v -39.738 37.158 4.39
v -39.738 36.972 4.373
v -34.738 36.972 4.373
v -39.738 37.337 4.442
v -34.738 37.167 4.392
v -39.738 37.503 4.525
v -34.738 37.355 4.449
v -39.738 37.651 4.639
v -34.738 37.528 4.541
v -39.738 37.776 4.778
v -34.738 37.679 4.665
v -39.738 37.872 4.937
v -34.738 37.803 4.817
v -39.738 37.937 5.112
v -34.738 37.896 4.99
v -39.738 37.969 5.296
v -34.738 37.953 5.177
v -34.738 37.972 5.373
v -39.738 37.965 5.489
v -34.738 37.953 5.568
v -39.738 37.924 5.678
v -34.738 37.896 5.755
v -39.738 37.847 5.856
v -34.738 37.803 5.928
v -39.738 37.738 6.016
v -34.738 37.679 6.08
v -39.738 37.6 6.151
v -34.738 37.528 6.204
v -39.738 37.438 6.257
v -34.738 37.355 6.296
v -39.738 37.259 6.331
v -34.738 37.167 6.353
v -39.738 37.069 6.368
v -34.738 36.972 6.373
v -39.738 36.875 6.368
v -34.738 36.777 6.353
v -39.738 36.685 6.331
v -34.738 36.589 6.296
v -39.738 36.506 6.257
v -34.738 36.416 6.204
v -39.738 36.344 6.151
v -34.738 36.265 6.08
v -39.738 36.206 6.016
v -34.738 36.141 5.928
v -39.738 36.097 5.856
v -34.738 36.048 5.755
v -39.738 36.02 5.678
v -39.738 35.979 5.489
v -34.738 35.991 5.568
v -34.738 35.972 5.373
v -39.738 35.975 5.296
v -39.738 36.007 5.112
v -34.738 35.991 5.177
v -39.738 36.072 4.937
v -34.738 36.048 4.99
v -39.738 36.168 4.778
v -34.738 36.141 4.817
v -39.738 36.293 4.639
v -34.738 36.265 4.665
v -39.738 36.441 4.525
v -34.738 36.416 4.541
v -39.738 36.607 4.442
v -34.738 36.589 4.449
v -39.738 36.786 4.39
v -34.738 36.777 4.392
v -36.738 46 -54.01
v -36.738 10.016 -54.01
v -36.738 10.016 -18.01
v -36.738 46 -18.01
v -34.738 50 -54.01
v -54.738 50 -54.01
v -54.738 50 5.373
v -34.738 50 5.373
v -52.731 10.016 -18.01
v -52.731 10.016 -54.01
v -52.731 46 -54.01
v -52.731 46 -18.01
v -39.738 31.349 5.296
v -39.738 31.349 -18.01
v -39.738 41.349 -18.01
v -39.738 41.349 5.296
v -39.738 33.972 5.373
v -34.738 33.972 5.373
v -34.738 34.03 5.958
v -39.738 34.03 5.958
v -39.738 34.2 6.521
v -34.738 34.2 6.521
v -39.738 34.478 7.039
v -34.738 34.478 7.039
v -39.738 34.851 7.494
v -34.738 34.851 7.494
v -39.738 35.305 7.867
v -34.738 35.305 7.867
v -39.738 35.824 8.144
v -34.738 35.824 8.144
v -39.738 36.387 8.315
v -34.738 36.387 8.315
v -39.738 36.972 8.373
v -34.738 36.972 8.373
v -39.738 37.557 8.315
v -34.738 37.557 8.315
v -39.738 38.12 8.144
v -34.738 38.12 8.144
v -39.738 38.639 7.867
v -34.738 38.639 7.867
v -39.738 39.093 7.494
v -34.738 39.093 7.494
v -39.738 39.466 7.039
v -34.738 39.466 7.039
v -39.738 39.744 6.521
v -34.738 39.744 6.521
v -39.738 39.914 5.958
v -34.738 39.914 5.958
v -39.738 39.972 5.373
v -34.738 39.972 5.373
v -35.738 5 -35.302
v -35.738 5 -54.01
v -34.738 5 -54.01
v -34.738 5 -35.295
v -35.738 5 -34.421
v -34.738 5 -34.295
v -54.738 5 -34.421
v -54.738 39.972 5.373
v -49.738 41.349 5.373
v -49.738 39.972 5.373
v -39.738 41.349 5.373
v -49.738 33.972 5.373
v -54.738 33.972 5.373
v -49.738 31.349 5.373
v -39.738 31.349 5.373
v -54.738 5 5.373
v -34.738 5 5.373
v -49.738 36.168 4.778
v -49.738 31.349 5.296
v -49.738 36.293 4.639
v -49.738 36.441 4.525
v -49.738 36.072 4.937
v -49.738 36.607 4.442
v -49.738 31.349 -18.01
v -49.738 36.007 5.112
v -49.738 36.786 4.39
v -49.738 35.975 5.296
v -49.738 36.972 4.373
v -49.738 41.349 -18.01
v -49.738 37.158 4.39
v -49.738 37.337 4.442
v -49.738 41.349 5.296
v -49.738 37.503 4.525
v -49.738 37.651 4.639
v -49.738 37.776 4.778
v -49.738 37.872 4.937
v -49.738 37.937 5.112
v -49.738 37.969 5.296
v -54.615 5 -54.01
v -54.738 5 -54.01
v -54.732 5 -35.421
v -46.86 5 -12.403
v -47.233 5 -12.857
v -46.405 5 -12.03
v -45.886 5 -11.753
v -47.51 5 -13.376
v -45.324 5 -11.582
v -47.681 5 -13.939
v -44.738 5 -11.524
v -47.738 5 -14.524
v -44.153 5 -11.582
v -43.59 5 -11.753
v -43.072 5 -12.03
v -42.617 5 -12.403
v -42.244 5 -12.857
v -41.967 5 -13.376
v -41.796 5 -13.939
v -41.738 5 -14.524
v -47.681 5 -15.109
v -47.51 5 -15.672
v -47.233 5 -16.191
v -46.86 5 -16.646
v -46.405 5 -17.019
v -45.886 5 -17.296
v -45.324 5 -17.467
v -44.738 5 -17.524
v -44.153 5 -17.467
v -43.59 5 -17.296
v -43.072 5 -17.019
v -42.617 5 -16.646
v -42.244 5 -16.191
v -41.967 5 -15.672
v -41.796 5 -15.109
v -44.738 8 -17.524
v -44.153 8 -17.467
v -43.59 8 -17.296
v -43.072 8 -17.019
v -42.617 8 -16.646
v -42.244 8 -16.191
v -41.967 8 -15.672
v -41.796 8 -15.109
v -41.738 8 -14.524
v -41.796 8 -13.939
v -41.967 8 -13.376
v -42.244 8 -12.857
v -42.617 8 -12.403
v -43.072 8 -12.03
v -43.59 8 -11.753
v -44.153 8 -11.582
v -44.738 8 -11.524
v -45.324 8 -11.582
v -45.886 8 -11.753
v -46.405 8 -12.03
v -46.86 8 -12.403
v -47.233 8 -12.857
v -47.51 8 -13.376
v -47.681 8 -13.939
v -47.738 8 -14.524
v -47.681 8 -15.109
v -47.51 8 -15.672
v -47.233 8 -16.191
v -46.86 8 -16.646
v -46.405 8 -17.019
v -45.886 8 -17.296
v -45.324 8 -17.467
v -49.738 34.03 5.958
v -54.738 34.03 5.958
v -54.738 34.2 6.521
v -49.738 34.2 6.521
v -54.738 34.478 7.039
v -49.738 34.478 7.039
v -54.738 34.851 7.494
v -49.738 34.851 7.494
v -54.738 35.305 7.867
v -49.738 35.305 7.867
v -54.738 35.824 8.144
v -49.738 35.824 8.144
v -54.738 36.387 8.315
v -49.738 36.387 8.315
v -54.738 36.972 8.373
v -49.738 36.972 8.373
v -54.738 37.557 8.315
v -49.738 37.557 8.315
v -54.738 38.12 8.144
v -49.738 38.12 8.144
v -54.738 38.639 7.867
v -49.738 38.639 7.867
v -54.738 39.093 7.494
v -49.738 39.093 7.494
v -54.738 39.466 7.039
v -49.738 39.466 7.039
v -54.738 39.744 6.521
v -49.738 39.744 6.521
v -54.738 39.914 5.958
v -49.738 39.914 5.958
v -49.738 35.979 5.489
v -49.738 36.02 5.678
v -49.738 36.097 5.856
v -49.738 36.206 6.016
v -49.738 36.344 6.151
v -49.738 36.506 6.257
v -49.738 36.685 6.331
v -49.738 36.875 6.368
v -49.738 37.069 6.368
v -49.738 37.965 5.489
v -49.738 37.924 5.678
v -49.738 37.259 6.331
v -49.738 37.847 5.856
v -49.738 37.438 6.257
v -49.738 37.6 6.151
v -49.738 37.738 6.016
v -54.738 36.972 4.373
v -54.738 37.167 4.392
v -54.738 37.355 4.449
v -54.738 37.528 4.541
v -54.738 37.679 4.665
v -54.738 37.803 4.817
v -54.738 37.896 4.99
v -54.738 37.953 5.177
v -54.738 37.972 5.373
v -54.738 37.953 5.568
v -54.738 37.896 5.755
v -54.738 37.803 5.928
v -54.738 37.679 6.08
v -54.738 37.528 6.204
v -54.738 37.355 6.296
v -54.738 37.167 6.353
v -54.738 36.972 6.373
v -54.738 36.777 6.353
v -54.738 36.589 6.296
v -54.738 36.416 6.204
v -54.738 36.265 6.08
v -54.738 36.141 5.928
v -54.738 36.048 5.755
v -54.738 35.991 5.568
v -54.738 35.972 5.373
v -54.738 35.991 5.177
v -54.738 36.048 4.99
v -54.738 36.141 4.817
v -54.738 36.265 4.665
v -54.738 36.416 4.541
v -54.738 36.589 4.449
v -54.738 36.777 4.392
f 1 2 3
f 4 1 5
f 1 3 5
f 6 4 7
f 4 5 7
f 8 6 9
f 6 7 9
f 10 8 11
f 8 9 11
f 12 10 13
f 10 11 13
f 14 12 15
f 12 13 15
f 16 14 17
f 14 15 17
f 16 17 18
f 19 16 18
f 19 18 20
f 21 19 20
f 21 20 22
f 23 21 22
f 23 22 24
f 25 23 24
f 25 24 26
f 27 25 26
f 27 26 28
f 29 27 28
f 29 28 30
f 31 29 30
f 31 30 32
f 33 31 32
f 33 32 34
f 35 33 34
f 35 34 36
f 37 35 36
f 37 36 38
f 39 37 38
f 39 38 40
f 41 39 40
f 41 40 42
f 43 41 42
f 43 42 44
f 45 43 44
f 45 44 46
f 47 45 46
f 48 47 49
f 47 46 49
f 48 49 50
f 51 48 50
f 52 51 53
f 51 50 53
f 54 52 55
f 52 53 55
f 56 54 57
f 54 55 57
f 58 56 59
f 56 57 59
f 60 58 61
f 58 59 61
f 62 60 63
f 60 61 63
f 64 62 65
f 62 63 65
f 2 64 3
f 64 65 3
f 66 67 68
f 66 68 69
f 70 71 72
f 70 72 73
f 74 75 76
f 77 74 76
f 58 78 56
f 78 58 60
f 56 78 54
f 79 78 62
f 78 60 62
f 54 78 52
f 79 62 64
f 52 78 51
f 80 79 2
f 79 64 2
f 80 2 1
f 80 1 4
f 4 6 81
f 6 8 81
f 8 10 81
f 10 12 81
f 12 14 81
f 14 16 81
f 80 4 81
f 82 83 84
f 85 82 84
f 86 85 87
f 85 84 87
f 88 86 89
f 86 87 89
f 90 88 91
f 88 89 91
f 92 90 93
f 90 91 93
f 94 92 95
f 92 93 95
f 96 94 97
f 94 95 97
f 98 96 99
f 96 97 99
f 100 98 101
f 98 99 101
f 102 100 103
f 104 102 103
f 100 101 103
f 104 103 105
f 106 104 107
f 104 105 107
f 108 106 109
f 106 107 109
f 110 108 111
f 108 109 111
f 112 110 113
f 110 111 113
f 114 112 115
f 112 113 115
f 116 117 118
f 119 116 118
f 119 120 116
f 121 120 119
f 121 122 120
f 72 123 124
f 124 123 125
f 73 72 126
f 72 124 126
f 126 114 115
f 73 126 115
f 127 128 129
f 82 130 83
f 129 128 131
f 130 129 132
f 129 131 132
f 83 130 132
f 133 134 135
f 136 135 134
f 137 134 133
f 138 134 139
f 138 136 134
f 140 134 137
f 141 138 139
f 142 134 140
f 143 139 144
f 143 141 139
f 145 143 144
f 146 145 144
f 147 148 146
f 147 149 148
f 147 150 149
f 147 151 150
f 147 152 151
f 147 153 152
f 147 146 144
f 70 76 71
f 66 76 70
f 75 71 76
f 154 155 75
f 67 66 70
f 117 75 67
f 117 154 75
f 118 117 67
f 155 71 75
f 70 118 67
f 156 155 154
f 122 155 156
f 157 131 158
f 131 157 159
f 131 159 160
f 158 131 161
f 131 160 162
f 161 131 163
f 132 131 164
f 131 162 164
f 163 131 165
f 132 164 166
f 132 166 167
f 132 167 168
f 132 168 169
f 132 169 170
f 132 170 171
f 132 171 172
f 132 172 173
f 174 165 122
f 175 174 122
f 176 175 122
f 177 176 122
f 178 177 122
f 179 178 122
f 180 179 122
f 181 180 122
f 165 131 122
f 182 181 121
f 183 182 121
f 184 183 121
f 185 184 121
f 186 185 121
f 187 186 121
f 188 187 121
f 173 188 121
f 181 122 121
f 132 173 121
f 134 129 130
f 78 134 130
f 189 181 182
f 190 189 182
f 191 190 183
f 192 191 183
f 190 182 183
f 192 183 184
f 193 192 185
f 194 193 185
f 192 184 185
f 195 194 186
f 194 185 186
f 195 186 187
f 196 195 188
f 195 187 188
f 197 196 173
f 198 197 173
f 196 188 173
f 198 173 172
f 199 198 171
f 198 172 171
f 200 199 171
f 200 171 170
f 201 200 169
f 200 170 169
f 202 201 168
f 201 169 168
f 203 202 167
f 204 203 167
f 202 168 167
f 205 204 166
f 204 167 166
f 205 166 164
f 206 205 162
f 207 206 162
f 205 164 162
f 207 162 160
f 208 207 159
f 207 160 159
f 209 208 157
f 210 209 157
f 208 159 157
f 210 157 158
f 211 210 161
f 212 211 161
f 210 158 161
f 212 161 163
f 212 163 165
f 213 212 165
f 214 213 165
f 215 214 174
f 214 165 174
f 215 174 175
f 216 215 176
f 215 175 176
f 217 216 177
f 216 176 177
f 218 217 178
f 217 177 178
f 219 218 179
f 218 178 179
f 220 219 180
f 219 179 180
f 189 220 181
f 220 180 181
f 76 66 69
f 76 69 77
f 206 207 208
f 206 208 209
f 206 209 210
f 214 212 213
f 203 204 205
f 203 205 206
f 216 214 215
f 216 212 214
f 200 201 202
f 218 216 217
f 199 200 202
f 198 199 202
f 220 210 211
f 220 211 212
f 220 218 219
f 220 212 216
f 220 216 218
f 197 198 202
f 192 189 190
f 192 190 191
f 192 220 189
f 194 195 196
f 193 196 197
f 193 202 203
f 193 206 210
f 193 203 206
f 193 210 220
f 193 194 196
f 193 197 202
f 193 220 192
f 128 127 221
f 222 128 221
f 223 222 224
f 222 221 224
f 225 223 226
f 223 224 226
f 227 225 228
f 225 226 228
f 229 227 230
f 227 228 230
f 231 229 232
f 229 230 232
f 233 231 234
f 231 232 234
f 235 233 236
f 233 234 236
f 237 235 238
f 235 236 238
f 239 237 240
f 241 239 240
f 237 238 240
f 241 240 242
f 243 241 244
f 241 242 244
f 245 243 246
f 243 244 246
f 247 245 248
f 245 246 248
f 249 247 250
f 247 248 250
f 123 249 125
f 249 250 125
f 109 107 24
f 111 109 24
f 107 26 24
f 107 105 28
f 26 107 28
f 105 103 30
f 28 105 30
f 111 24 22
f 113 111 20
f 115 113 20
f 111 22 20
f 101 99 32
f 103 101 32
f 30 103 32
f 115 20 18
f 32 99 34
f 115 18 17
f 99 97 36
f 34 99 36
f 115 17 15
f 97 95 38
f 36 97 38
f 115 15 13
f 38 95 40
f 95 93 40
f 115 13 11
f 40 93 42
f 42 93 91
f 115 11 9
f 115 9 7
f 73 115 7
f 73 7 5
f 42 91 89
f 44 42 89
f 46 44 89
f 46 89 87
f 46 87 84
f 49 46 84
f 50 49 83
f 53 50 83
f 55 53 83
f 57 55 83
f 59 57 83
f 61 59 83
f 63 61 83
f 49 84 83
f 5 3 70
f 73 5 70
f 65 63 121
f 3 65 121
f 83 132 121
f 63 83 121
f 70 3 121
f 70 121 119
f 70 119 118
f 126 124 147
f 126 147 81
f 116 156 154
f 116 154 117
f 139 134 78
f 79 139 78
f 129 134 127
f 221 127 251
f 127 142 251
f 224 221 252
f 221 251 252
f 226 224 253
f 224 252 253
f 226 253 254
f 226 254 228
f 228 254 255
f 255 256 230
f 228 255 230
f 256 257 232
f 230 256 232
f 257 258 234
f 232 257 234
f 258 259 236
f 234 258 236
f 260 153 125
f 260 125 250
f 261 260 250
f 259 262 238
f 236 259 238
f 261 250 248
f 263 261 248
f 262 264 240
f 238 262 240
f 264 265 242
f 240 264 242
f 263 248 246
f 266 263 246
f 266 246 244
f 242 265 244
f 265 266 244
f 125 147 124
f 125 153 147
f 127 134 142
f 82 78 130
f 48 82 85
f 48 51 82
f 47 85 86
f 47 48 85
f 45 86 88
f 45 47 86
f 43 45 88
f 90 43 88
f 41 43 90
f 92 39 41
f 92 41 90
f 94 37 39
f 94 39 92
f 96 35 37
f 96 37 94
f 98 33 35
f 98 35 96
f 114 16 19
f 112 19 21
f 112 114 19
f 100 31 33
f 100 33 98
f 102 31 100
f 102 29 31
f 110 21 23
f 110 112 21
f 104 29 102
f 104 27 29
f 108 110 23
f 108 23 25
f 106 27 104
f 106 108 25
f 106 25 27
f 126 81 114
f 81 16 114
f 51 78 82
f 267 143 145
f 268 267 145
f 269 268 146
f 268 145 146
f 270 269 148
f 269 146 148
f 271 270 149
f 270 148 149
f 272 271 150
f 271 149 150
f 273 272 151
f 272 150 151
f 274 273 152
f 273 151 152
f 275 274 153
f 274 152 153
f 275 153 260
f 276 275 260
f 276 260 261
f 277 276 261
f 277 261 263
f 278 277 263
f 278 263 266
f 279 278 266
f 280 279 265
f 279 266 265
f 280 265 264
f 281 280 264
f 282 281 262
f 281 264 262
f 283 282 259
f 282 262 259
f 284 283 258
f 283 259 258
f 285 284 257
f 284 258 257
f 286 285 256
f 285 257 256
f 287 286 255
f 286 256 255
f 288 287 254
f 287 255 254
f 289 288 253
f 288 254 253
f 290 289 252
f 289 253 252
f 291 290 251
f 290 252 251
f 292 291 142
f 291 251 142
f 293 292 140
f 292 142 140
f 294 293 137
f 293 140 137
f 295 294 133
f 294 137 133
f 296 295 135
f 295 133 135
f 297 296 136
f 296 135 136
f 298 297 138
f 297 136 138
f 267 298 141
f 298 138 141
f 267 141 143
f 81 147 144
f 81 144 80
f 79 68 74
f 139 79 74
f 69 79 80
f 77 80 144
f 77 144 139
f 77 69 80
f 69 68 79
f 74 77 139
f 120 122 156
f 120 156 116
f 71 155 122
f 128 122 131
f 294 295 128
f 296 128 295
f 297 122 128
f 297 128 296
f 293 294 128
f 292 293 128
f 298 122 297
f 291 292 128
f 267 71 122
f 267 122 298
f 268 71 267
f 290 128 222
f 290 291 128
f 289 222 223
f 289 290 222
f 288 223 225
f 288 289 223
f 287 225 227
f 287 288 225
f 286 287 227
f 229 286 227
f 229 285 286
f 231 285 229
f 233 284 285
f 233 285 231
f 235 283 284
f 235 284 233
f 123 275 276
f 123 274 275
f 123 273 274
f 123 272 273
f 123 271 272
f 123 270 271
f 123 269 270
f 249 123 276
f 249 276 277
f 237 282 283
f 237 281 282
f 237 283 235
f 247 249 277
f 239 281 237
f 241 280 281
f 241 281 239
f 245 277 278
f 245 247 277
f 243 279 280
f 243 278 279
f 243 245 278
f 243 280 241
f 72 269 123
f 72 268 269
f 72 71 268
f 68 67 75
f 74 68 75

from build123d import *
from build123d.topology import SkipClean

# Parameters (mm, degrees)
BOSS_EXTRUDE2_DEPTH      = 50
BOSS_EXTRUDE2_DEPTH_BACK = 0.0001
SKETCH5_W                = 20
SKETCH5_H                = 59.382936356
SKETCH6_R                = 5
CUT_EXTRUDE1_DEPTH       = 45
SKETCH9_W                = 10
SKETCH9_H                = 10
CUT_EXTRUDE4_DEPTH       = 0.076800532
BOSS_EXTRUDE5_DEPTH      = 5
CUT_EXTRUDE6_DEPTH       = 5
BOSS_EXTRUDE6_START      = -5
BOSS_EXTRUDE6_DEPTH      = 5
SKETCH15_R               = 1
CUT_EXTRUDE7_DEPTH       = 20
SKETCH19_R               = 5
BOSS_EXTRUDE13_DEPTH     = 45
BOSS_EXTRUDE15_DEPTH     = 5
SKETCH22_R               = 1
CUT_EXTRUDE8_DEPTH       = 5
BOSS_EXTRUDE16_START     = -5
BOSS_EXTRUDE16_DEPTH     = 5
SKETCH24_W               = 15.993114704
SKETCH24_H               = 35.984045661
CUT_EXTRUDE9_DEPTH       = 36
SKETCH26_W               = 10
SKETCH26_H               = 10
CUT_EXTRUDE13_DEPTH      = 36
CUT_EXTRUDE14_DEPTH      = 5
SKETCH29_W               = 20.000394844
SKETCH29_H               = 5
CUT_EXTRUDE15_DEPTH      = 1
SKETCH31_R               = 3
CUT_EXTRUDE16_DEPTH      = 3
SKETCH32_W               = 19.994111152
SKETCH32_H               = 5
CUT_EXTRUDE17_DEPTH      = 19
SKETCH33_W               = 19.589439069
SKETCH33_H               = 5
CUT_EXTRUDE18_DEPTH      = 19


with BuildPart() as part:
    # Sketch5 → Boss-Extrude2 (new, two sides: drawn at the far end of the back side and taken through both)
    with BuildSketch(Plane(origin=(0.323578151, 0, -7.846011644), x_dir=(1, 0, 0), z_dir=(0, 1, 0)).offset(-BOSS_EXTRUDE2_DEPTH_BACK)):
        with Locations((-45.061859189, 16.472889188)):
            Rectangle(SKETCH5_W, SKETCH5_H)
    extrude(amount=BOSS_EXTRUDE2_DEPTH + BOSS_EXTRUDE2_DEPTH_BACK)

    # Sketch6 → Cut-Extrude1 (cut)
    with BuildSketch(Plane(origin=(0.323578151, 50, -7.846011644), x_dir=(1, 0, 0), z_dir=(0, 1, 0))):
        with Locations(Location((-45.061859189, 16.574918296, 0), (0, 0, 270))):
            Circle(SKETCH6_R)
    extrude(amount=-CUT_EXTRUDE1_DEPTH, mode=Mode.SUBTRACT)

    # Sketch9 → Cut-Extrude4 (cut)
    with BuildSketch(Plane(origin=(0.323578151, 0, 5.372567346), x_dir=(1, 0, 0), z_dir=(0, 0, 1))):
        with Locations((-45.061859189, 36.348822535)):
            Rectangle(SKETCH9_W, SKETCH9_H)
    extrude(amount=-CUT_EXTRUDE4_DEPTH, mode=Mode.SUBTRACT)

    # Sketch10 → Boss-Extrude5 (add)
    with BuildSketch(Plane(origin=(-34.738281038, 0, -7.846011644), x_dir=(0, 0, -1), z_dir=(1, 0, 0))):
        with BuildLine():
            Line((-13.21857899, 38.972016939), (-13.21857899, 34.972016939))
            ThreePointArc((-13.21857899, 34.972016939), (-15.21857899, 36.972016939), (-13.21857899, 38.972016939))
        make_face()
    extrude(amount=-BOSS_EXTRUDE5_DEPTH)

    # Sketch12 → Cut-Extrude6 (cut)
    with BuildSketch(Plane(origin=(-34.738281038, 0, -7.846011644), x_dir=(0, 0, -1), z_dir=(1, 0, 0))):
        with BuildLine():
            Line((-13.21857899, 37.972016939), (-13.21857899, 35.972016939))
            ThreePointArc((-13.21857899, 35.972016939), (-14.21857899, 36.972016939), (-13.21857899, 37.972016939))
        make_face()
    extrude(amount=-CUT_EXTRUDE6_DEPTH, mode=Mode.SUBTRACT)

    # Sketch14 → Boss-Extrude6 (add)
    with BuildSketch(Plane(origin=(-54.738281038, 0, -7.846011644), x_dir=(0, 0, 1), z_dir=(-1, 0, 0)).offset(BOSS_EXTRUDE6_START)):
        with BuildLine():
            Line((13.21857899, 37.972016939), (13.21857899, 38.972016939))
            ThreePointArc((13.21857899, 38.972016939), (15.21857899, 36.972016939), (13.21857899, 34.972016939))
            Line((13.21857899, 34.972016939), (13.21857899, 35.972016939))
            ThreePointArc((13.21857899, 35.972016939), (14.21857899, 36.972016939), (13.21857899, 37.972016939))
        make_face()
    extrude(amount=BOSS_EXTRUDE6_DEPTH)

    # Sketch15 → Cut-Extrude7 (cut)
    with BuildSketch(Plane(origin=(-34.738281038, 0, -7.846011644), x_dir=(0, 0, -1), z_dir=(1, 0, 0))):
        with Locations((-13.21857899, 36.972016939)):
            Circle(SKETCH15_R)
    extrude(amount=-CUT_EXTRUDE7_DEPTH, mode=Mode.SUBTRACT)

    # Sketch19 → Boss-Extrude13 (add)
    with BuildSketch(Plane(origin=(0.323578151, 50, -7.846011644), x_dir=(1, 0, 0), z_dir=(0, 1, 0))):
        with Locations((-45.061859189, 16.574918296)):
            Circle(SKETCH19_R)
    extrude(amount=-BOSS_EXTRUDE13_DEPTH)

    # Sketch21 → Boss-Extrude15 (add)
    with SkipClean():  # the faces are left unmerged after this step: merging them gives an invalid solid
        with BuildSketch(Plane(origin=(-34.738281038, 0, -7.846011644), x_dir=(0, 0, -1), z_dir=(1, 0, 0))):
            with BuildLine():
                Line((-13.21857899, 39.972016939), (-13.21857899, 37.972016939))
                ThreePointArc((-13.21857899, 37.972016939), (-12.21857899, 36.972016939), (-13.21857899, 35.972016939))
                Line((-13.21857899, 35.972016939), (-13.21857899, 33.972016939))
                ThreePointArc((-13.21857899, 33.972016939), (-16.21857899, 36.972016939), (-13.21857899, 39.972016939))
            make_face()
        extrude(amount=-BOSS_EXTRUDE15_DEPTH)

    # Sketch22 → Cut-Extrude8 (cut)
    with BuildSketch(Plane(origin=(-34.738281038, 0, -7.846011644), x_dir=(0, 0, -1), z_dir=(1, 0, 0))):
        with Locations((-13.21857899, 36.972016939)):
            Circle(SKETCH22_R)
    extrude(amount=-CUT_EXTRUDE8_DEPTH, mode=Mode.SUBTRACT)

    # Sketch23 → Boss-Extrude16 (add)
    with BuildSketch(Plane(origin=(-54.738281038, 0, -7.846011644), x_dir=(0, 0, 1), z_dir=(-1, 0, 0)).offset(BOSS_EXTRUDE16_START)):
        with BuildLine():
            Line((13.21857899, 39.972016939), (13.21857899, 37.972016939))
            ThreePointArc((13.21857899, 37.972016939), (14.21857899, 36.972016939), (13.21857899, 35.972016939))
            Line((13.21857899, 35.972016939), (13.21857899, 33.972016939))
            ThreePointArc((13.21857899, 33.972016939), (16.21857899, 36.972016939), (13.21857899, 39.972016939))
        make_face()
    extrude(amount=BOSS_EXTRUDE16_DEPTH)

    # Sketch24 → Cut-Extrude9 (cut)
    with SkipClean():  # the faces are left unmerged after this step: merging them gives an invalid solid
        with BuildSketch(Plane(origin=(0.323578151, 0, -54.01036901), x_dir=(-1, 0, 0), z_dir=(0, 0, -1))):
            with Locations((45.058416541, 28.00797717)):
                Rectangle(SKETCH24_W, SKETCH24_H)
        extrude(amount=-CUT_EXTRUDE9_DEPTH, mode=Mode.SUBTRACT)

    # Sketch26 → Cut-Extrude13 (cut)
    with SkipClean():  # the faces are left unmerged after this step: merging them gives an invalid solid
        with BuildSketch(Plane(origin=(0.323578151, 0, 5.295766814), x_dir=(1, 0, 0), z_dir=(0, 0, 1))):
            with Locations((-45.061859189, 36.348822535)):
                Rectangle(SKETCH26_W, SKETCH26_H)
        extrude(amount=-CUT_EXTRUDE13_DEPTH, mode=Mode.SUBTRACT)

    # Sketch28 → Cut-Extrude14 (cut)
    with SkipClean():  # the faces are left unmerged after this step: merging them gives an invalid solid
        with BuildSketch(Plane(origin=(0, -0.0001, -2.541953713), x_dir=(-1, 0, 0), z_dir=(0, -1, 0))):
            Polygon((54.738281038, -7.914521059), (34.738281038, -7.914521059), (34.738281038, 31.753302396), (54.738281038, 31.878976227), align=None)
        extrude(amount=-CUT_EXTRUDE14_DEPTH, mode=Mode.SUBTRACT)

    # Sketch29 → Cut-Extrude15 (cut)
    with SkipClean():  # the faces are left unmerged after this step: merging them gives an invalid solid
        with BuildSketch(Plane(origin=(0.1981485, 0, -34.075726363), x_dir=(0.9999802581949765, 0, 0.006283567482586401), z_dir=(-0.006283567482586401, 0, 0.9999802581949766))):
            with Locations((-44.937316682, 2.4999)):
                Rectangle(SKETCH29_W, SKETCH29_H)
        extrude(amount=-CUT_EXTRUDE15_DEPTH, mode=Mode.SUBTRACT)

    # Sketch31 → Cut-Extrude16 (cut)
    with SkipClean():  # the faces are left unmerged after this step: merging them gives an invalid solid
        with BuildSketch(Plane(origin=(0, 4.9999, -2.541953713), x_dir=(-1, 0, 0), z_dir=(0, -1, 0))):
            with Locations(Location((44.738281038, 11.982227584, 0), (0, 0, 90))):
                Circle(SKETCH31_R)
        extrude(amount=-CUT_EXTRUDE16_DEPTH, mode=Mode.SUBTRACT)

    # Sketch32 → Cut-Extrude17 (cut)
    with SkipClean():  # the faces are left unmerged after this step: merging them gives an invalid solid
        with BuildSketch(Plane(origin=(0.22040429, 0, -35.075606257), x_dir=(0.9999802581949765, 0, 0.0062835674825864034), z_dir=(-0.0062835674825864034, 0, 0.9999802581949766))):
            with Locations((-44.956431065, 2.4999)):
                Rectangle(SKETCH32_W, SKETCH32_H)
        extrude(amount=-CUT_EXTRUDE17_DEPTH, mode=Mode.SUBTRACT)

    # Sketch33 → Cut-Extrude18 (cut)
    with SkipClean():  # the faces are left unmerged after this step: merging them gives an invalid solid
        with BuildSketch(Plane.ZY.offset(54.738281038)):
            with Locations((-44.215649476, 2.4999)):
                Rectangle(SKETCH33_W, SKETCH33_H)
        extrude(amount=-CUT_EXTRUDE18_DEPTH, mode=Mode.SUBTRACT)


solid = part.part
